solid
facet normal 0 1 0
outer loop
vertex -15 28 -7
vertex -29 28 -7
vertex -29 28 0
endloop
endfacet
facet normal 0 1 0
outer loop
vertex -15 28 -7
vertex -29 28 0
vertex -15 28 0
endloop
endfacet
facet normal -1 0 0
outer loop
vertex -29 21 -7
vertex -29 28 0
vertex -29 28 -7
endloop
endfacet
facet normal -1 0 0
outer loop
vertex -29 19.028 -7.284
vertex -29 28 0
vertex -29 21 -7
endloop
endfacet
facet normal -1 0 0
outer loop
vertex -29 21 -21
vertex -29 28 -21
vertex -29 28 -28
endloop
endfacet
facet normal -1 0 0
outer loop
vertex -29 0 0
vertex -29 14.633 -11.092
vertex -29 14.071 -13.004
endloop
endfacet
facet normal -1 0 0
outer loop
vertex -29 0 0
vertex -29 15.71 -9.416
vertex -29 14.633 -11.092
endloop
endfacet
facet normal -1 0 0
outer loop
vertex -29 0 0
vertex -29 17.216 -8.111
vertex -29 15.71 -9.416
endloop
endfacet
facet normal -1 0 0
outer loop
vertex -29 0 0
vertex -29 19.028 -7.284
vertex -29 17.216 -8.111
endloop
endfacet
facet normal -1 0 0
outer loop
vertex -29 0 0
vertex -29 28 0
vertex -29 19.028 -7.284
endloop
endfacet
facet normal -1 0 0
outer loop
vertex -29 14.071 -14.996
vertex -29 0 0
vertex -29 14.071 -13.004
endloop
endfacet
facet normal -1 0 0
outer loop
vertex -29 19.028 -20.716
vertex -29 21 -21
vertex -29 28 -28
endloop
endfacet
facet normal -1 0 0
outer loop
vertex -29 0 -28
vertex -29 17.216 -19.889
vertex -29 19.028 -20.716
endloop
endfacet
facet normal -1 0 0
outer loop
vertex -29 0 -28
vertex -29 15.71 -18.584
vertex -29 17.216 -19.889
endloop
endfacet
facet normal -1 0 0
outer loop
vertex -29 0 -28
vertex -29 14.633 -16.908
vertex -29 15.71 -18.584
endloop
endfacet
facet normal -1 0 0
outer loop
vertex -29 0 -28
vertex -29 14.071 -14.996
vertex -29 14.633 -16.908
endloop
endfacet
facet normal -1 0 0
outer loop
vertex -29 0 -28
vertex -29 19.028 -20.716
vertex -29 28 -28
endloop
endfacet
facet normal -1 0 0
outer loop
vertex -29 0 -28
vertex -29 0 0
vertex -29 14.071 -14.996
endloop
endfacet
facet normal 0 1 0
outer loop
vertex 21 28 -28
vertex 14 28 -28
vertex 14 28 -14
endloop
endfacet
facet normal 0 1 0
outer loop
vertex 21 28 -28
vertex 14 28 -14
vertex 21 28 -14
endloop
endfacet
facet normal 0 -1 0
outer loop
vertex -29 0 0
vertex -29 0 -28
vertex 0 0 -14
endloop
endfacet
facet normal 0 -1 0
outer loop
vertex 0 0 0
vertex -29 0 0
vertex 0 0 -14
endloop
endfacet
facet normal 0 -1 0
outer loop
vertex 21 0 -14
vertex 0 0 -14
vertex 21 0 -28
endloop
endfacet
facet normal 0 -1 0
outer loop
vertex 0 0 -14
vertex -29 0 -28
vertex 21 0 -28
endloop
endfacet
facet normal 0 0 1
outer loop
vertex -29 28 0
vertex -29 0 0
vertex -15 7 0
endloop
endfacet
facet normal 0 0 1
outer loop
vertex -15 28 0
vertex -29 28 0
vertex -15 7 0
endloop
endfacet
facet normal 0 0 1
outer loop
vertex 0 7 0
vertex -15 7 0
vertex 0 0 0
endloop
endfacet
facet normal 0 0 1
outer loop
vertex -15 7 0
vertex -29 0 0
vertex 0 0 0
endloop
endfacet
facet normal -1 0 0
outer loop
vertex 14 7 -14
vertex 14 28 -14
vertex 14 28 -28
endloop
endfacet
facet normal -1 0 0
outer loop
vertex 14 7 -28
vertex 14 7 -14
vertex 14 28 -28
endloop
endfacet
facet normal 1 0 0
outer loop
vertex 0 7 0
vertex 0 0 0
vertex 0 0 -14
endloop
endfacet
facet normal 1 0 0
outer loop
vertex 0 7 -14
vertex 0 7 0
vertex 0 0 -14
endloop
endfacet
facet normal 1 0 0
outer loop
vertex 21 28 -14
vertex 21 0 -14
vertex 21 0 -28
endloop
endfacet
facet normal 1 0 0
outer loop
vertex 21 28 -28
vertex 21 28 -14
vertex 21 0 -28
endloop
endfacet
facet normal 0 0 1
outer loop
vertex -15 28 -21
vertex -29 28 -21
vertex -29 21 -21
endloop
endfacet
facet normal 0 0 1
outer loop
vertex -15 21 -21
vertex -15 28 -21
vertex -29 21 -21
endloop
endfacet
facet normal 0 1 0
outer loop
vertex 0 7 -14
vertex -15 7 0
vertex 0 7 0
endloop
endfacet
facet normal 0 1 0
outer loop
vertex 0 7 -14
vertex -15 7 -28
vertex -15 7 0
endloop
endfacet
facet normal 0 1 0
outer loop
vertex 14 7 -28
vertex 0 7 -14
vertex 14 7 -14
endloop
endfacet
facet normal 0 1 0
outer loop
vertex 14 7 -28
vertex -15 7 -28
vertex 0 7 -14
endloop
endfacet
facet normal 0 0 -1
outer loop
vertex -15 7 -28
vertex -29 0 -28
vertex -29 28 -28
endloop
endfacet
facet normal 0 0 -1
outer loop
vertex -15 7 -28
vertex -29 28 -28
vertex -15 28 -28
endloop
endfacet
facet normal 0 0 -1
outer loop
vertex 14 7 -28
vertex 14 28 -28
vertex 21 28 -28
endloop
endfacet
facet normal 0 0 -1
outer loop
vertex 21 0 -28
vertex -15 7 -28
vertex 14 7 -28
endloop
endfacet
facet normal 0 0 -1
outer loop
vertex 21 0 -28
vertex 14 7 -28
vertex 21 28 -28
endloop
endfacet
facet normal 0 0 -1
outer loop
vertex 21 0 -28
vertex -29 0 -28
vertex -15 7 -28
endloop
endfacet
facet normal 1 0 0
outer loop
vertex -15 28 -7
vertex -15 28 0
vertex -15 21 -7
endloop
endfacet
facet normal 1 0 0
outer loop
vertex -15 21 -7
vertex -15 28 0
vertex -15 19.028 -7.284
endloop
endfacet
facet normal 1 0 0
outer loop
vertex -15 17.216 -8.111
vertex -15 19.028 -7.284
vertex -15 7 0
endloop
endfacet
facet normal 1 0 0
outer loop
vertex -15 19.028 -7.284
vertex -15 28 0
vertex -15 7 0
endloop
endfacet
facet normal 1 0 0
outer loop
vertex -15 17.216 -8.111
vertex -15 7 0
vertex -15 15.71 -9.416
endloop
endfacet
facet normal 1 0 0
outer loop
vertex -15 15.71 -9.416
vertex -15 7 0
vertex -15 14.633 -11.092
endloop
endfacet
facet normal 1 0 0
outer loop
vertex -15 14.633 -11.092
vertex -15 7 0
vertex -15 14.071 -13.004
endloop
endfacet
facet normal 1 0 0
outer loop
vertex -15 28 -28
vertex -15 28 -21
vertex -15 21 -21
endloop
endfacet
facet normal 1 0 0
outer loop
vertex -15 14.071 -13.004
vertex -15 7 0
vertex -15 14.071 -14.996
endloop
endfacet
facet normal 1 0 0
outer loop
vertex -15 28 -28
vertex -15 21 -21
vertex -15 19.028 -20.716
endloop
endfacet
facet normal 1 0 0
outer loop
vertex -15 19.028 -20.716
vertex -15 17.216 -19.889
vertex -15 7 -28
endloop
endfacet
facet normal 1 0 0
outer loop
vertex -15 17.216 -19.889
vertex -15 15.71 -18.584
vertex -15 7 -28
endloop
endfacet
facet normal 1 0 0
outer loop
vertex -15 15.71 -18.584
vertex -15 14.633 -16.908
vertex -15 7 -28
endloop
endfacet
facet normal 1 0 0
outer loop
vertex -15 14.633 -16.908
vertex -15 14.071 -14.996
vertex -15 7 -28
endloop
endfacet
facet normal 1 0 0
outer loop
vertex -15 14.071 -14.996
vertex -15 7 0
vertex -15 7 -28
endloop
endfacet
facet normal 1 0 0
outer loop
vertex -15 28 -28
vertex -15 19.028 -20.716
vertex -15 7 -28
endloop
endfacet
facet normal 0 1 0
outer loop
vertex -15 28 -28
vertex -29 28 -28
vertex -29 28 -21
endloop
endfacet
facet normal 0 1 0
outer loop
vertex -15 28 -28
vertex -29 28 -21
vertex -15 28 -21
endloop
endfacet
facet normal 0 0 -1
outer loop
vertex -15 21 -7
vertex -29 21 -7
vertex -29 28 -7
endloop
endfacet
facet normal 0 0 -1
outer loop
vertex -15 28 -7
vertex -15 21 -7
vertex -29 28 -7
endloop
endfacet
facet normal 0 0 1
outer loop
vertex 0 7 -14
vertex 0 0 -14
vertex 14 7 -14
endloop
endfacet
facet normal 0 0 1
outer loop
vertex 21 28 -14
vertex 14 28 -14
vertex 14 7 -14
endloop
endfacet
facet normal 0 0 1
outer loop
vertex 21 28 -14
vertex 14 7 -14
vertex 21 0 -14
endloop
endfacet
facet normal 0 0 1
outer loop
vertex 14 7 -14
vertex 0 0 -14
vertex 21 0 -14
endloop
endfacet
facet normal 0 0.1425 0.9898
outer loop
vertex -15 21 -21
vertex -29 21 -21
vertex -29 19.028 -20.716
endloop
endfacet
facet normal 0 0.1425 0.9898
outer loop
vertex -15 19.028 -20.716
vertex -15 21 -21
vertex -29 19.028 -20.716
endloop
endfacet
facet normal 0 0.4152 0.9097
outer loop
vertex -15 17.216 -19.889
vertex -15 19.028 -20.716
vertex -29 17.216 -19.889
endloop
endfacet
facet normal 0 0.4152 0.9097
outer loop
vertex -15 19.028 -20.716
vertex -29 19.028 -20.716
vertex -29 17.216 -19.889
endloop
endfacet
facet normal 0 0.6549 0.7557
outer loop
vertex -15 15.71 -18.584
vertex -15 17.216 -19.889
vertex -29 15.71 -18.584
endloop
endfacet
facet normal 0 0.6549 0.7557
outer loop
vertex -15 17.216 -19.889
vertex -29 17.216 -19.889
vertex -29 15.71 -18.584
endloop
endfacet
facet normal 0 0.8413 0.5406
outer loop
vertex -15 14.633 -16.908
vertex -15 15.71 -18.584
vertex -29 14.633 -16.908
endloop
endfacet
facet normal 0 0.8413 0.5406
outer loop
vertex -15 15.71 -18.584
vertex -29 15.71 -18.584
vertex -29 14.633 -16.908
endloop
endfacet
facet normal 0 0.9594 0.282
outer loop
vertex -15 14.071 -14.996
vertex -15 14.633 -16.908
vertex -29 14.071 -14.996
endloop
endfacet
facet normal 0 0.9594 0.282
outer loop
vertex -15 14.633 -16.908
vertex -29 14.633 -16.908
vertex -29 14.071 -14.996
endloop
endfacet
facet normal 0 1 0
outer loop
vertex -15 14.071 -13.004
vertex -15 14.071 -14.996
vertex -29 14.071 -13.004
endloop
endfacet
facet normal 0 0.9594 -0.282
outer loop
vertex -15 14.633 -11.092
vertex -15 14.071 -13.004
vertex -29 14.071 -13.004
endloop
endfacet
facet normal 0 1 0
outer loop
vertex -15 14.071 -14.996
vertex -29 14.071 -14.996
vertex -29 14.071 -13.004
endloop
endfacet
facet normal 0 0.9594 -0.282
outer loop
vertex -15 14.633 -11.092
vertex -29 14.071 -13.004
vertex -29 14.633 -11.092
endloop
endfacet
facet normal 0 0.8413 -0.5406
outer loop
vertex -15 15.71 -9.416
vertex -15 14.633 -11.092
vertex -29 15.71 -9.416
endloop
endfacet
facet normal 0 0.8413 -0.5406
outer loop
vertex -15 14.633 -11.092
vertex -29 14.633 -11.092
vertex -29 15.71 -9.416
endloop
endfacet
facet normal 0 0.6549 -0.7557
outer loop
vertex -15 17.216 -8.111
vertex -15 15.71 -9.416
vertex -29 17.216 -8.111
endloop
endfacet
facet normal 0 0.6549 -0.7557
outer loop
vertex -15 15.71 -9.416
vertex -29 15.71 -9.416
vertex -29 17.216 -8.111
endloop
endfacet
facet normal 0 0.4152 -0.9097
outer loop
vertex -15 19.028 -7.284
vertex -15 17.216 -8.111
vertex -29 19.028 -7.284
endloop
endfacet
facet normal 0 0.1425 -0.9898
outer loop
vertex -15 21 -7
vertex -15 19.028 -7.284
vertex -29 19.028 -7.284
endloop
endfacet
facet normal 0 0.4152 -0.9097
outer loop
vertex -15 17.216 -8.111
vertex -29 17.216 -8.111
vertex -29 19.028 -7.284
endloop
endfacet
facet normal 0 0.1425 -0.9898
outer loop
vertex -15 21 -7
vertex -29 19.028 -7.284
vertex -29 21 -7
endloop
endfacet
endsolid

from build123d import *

# Parameters (mm, degrees)
BOSS_EXTRUDE1_DEPTH     = 7
SKETCH1_3_W             = 14
SKETCH1_3_H             = 28
SKETCH1_3_W_2           = 7
SKETCH1_3_H_2           = 14
BOSS_EXTRUDE2_DEPTH     = 28
CUT_EXTRUDE1_DEPTH      = 1
CUT_EXTRUDE1_DEPTH_BACK = 28


with BuildPart() as part:
    # Sketch1 → Boss-Extrude1 (new body)
    with BuildSketch(Plane(origin=(0, 0, 0), x_dir=(1, 0, 0), z_dir=(0, 1, 0))):
        Polygon((-15, 0), (0, 0), (0, 14), (14, 14), (14, 28), (-15, 28), align=None)
    extrude(amount=BOSS_EXTRUDE1_DEPTH)

    # Sketch1<3> → Boss-Extrude2 (add)
    with BuildSketch(Plane(origin=(0, 0, 0), x_dir=(1, 0, 0), z_dir=(0, 1, 0))):
        with Locations((-22, 14)):
            Rectangle(SKETCH1_3_W, SKETCH1_3_H)
        with Locations((17.5, 21)):
            Rectangle(SKETCH1_3_W_2, SKETCH1_3_H_2)
    extrude(amount=BOSS_EXTRUDE2_DEPTH)

    # Sketch2 → Cut-Extrude1 (cut, two sides)
    with BuildSketch(Plane.ZY.offset(29)) as cut_extrude1_sk:
        with BuildLine():
            Line((-21, 108), (-21, 28))
            Line((-21, 28), (-21, 21))
            ThreePointArc((-21, 21), (-14, 14), (-7, 21))
            Line((-7, 21), (-7, 28))
            Line((-7, 28), (-7, 108))
            Line((-7, 108), (-7, 268))
            Line((-7, 268), (-21, 268))
            Line((-21, 268), (-21, 108))
        make_face()
    extrude(amount=CUT_EXTRUDE1_DEPTH, mode=Mode.SUBTRACT)
    extrude(cut_extrude1_sk.sketch, amount=-CUT_EXTRUDE1_DEPTH_BACK, mode=Mode.SUBTRACT)


solid = part.part
